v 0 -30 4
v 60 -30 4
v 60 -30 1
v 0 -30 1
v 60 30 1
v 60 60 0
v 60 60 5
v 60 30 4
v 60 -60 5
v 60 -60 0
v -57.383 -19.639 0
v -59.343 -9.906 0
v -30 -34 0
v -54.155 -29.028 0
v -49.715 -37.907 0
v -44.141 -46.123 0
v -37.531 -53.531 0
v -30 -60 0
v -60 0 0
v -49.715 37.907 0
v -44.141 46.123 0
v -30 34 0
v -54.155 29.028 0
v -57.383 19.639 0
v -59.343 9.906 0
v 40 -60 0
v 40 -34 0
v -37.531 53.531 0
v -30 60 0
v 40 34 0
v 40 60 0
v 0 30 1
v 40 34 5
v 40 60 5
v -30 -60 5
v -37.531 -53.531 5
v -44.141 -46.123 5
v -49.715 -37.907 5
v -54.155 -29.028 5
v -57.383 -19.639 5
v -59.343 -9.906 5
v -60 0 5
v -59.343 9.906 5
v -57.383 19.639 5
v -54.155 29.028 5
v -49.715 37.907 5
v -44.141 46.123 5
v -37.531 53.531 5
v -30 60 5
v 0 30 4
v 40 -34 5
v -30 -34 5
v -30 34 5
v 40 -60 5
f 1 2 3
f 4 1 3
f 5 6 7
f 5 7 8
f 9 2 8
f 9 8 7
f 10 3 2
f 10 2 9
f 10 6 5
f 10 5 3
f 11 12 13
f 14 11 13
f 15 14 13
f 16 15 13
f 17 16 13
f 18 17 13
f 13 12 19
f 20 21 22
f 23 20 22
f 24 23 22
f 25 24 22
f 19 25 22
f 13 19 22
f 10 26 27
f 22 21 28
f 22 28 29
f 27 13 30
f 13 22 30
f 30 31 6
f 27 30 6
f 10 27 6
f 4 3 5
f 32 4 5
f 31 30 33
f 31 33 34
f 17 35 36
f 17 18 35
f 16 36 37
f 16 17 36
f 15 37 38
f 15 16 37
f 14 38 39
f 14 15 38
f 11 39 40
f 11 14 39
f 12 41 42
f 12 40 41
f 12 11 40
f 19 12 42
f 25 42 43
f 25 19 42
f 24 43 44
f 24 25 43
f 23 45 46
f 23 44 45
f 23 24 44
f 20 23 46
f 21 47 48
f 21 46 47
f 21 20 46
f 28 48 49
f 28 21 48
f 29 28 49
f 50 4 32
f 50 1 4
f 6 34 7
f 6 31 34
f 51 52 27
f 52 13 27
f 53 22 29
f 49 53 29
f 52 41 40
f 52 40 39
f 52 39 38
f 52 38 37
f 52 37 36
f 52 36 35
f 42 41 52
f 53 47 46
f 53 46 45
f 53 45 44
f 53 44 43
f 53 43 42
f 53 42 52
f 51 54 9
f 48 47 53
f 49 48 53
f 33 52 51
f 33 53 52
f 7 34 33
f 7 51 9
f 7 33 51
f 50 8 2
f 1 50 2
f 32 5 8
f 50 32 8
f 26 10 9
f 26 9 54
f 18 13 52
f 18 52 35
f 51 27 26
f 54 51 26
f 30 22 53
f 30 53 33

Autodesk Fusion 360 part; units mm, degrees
sketch "Bottom front base" plane through (0, 0, 0) normal (0, 0, 1) x (1, 0, 0)
  line L0 (40, 60) -> (60, 60)
  line L1 (60, 60) -> (60, -60)
  line L2 (60, -60) -> (40, -60)
  line L3 (60, 0) -> (57.5, 0) construction
  line L4 (57.5, -60) -> (57.5, -6) construction
  line L5 (57.5, -6) -> (-12.5, -6) construction
  line L6 (-12.5, -6) -> (-12.5, -34) construction
  line L7 (-12.5, -34) -> (-30, -34)
  line L8 (-12.5, -34) -> (40, -34)
  line L9 (40, -34) -> (40, -60)
  line L10 (-30, -34) -> (-30, -60)
  arc A0 (-30, 60) -> (-30, -60) centre (15, 0) ccw
  line L11 (-30, 34) -> (-30, 60)
  line L12 (-12.5, 34) -> (40, 34)
  line L13 (-12.5, 34) -> (-30, 34)
  line L14 (40, 34) -> (40, 60)
  dimension "d1" = 120
  dimension "d3" = 2.5
  dimension "d4" = 54
  dimension "d5" = 70
  dimension "d6" = 28
  dimension "d9" = 70
extrude "Bottom front height" add sketch "Bottom front base" along normal blind 5
sketch "Connector hole" plane through (60, 0, 0) normal (1, 0, 0) x (0, 1, 0)
  line L0 (-60, 0) -> (60, 0)
  line L1 (60, 0) -> (60, 5)
  line L2 (60, 5) -> (-60, 5)
  line L3 (-60, 5) -> (-60, 0)
  line L4 (0, 0) -> (0, -0.1551)
  line L5 (0, 0) -> (0, 5) construction
  line L6 (30, 4) -> (-30, 4)
  line L7 (-30, 4) -> (-30, 1)
  line L8 (-30, 1) -> (30, 1)
  line L9 (30, 1) -> (30, 4)
  line L10 (30, 4) -> (-30, 1) construction
  line L11 (-30, 4) -> (30, 1) construction
  point P0 (0, 2.5)
  dimension "d12" = 3
  dimension "d13" = 60
extrude "Connector hole (1)" cut sketch "Connector hole" against normal blind 60 contours L6 L7 L8 L9
equation "d6 = 54 mm - 26 mm"
